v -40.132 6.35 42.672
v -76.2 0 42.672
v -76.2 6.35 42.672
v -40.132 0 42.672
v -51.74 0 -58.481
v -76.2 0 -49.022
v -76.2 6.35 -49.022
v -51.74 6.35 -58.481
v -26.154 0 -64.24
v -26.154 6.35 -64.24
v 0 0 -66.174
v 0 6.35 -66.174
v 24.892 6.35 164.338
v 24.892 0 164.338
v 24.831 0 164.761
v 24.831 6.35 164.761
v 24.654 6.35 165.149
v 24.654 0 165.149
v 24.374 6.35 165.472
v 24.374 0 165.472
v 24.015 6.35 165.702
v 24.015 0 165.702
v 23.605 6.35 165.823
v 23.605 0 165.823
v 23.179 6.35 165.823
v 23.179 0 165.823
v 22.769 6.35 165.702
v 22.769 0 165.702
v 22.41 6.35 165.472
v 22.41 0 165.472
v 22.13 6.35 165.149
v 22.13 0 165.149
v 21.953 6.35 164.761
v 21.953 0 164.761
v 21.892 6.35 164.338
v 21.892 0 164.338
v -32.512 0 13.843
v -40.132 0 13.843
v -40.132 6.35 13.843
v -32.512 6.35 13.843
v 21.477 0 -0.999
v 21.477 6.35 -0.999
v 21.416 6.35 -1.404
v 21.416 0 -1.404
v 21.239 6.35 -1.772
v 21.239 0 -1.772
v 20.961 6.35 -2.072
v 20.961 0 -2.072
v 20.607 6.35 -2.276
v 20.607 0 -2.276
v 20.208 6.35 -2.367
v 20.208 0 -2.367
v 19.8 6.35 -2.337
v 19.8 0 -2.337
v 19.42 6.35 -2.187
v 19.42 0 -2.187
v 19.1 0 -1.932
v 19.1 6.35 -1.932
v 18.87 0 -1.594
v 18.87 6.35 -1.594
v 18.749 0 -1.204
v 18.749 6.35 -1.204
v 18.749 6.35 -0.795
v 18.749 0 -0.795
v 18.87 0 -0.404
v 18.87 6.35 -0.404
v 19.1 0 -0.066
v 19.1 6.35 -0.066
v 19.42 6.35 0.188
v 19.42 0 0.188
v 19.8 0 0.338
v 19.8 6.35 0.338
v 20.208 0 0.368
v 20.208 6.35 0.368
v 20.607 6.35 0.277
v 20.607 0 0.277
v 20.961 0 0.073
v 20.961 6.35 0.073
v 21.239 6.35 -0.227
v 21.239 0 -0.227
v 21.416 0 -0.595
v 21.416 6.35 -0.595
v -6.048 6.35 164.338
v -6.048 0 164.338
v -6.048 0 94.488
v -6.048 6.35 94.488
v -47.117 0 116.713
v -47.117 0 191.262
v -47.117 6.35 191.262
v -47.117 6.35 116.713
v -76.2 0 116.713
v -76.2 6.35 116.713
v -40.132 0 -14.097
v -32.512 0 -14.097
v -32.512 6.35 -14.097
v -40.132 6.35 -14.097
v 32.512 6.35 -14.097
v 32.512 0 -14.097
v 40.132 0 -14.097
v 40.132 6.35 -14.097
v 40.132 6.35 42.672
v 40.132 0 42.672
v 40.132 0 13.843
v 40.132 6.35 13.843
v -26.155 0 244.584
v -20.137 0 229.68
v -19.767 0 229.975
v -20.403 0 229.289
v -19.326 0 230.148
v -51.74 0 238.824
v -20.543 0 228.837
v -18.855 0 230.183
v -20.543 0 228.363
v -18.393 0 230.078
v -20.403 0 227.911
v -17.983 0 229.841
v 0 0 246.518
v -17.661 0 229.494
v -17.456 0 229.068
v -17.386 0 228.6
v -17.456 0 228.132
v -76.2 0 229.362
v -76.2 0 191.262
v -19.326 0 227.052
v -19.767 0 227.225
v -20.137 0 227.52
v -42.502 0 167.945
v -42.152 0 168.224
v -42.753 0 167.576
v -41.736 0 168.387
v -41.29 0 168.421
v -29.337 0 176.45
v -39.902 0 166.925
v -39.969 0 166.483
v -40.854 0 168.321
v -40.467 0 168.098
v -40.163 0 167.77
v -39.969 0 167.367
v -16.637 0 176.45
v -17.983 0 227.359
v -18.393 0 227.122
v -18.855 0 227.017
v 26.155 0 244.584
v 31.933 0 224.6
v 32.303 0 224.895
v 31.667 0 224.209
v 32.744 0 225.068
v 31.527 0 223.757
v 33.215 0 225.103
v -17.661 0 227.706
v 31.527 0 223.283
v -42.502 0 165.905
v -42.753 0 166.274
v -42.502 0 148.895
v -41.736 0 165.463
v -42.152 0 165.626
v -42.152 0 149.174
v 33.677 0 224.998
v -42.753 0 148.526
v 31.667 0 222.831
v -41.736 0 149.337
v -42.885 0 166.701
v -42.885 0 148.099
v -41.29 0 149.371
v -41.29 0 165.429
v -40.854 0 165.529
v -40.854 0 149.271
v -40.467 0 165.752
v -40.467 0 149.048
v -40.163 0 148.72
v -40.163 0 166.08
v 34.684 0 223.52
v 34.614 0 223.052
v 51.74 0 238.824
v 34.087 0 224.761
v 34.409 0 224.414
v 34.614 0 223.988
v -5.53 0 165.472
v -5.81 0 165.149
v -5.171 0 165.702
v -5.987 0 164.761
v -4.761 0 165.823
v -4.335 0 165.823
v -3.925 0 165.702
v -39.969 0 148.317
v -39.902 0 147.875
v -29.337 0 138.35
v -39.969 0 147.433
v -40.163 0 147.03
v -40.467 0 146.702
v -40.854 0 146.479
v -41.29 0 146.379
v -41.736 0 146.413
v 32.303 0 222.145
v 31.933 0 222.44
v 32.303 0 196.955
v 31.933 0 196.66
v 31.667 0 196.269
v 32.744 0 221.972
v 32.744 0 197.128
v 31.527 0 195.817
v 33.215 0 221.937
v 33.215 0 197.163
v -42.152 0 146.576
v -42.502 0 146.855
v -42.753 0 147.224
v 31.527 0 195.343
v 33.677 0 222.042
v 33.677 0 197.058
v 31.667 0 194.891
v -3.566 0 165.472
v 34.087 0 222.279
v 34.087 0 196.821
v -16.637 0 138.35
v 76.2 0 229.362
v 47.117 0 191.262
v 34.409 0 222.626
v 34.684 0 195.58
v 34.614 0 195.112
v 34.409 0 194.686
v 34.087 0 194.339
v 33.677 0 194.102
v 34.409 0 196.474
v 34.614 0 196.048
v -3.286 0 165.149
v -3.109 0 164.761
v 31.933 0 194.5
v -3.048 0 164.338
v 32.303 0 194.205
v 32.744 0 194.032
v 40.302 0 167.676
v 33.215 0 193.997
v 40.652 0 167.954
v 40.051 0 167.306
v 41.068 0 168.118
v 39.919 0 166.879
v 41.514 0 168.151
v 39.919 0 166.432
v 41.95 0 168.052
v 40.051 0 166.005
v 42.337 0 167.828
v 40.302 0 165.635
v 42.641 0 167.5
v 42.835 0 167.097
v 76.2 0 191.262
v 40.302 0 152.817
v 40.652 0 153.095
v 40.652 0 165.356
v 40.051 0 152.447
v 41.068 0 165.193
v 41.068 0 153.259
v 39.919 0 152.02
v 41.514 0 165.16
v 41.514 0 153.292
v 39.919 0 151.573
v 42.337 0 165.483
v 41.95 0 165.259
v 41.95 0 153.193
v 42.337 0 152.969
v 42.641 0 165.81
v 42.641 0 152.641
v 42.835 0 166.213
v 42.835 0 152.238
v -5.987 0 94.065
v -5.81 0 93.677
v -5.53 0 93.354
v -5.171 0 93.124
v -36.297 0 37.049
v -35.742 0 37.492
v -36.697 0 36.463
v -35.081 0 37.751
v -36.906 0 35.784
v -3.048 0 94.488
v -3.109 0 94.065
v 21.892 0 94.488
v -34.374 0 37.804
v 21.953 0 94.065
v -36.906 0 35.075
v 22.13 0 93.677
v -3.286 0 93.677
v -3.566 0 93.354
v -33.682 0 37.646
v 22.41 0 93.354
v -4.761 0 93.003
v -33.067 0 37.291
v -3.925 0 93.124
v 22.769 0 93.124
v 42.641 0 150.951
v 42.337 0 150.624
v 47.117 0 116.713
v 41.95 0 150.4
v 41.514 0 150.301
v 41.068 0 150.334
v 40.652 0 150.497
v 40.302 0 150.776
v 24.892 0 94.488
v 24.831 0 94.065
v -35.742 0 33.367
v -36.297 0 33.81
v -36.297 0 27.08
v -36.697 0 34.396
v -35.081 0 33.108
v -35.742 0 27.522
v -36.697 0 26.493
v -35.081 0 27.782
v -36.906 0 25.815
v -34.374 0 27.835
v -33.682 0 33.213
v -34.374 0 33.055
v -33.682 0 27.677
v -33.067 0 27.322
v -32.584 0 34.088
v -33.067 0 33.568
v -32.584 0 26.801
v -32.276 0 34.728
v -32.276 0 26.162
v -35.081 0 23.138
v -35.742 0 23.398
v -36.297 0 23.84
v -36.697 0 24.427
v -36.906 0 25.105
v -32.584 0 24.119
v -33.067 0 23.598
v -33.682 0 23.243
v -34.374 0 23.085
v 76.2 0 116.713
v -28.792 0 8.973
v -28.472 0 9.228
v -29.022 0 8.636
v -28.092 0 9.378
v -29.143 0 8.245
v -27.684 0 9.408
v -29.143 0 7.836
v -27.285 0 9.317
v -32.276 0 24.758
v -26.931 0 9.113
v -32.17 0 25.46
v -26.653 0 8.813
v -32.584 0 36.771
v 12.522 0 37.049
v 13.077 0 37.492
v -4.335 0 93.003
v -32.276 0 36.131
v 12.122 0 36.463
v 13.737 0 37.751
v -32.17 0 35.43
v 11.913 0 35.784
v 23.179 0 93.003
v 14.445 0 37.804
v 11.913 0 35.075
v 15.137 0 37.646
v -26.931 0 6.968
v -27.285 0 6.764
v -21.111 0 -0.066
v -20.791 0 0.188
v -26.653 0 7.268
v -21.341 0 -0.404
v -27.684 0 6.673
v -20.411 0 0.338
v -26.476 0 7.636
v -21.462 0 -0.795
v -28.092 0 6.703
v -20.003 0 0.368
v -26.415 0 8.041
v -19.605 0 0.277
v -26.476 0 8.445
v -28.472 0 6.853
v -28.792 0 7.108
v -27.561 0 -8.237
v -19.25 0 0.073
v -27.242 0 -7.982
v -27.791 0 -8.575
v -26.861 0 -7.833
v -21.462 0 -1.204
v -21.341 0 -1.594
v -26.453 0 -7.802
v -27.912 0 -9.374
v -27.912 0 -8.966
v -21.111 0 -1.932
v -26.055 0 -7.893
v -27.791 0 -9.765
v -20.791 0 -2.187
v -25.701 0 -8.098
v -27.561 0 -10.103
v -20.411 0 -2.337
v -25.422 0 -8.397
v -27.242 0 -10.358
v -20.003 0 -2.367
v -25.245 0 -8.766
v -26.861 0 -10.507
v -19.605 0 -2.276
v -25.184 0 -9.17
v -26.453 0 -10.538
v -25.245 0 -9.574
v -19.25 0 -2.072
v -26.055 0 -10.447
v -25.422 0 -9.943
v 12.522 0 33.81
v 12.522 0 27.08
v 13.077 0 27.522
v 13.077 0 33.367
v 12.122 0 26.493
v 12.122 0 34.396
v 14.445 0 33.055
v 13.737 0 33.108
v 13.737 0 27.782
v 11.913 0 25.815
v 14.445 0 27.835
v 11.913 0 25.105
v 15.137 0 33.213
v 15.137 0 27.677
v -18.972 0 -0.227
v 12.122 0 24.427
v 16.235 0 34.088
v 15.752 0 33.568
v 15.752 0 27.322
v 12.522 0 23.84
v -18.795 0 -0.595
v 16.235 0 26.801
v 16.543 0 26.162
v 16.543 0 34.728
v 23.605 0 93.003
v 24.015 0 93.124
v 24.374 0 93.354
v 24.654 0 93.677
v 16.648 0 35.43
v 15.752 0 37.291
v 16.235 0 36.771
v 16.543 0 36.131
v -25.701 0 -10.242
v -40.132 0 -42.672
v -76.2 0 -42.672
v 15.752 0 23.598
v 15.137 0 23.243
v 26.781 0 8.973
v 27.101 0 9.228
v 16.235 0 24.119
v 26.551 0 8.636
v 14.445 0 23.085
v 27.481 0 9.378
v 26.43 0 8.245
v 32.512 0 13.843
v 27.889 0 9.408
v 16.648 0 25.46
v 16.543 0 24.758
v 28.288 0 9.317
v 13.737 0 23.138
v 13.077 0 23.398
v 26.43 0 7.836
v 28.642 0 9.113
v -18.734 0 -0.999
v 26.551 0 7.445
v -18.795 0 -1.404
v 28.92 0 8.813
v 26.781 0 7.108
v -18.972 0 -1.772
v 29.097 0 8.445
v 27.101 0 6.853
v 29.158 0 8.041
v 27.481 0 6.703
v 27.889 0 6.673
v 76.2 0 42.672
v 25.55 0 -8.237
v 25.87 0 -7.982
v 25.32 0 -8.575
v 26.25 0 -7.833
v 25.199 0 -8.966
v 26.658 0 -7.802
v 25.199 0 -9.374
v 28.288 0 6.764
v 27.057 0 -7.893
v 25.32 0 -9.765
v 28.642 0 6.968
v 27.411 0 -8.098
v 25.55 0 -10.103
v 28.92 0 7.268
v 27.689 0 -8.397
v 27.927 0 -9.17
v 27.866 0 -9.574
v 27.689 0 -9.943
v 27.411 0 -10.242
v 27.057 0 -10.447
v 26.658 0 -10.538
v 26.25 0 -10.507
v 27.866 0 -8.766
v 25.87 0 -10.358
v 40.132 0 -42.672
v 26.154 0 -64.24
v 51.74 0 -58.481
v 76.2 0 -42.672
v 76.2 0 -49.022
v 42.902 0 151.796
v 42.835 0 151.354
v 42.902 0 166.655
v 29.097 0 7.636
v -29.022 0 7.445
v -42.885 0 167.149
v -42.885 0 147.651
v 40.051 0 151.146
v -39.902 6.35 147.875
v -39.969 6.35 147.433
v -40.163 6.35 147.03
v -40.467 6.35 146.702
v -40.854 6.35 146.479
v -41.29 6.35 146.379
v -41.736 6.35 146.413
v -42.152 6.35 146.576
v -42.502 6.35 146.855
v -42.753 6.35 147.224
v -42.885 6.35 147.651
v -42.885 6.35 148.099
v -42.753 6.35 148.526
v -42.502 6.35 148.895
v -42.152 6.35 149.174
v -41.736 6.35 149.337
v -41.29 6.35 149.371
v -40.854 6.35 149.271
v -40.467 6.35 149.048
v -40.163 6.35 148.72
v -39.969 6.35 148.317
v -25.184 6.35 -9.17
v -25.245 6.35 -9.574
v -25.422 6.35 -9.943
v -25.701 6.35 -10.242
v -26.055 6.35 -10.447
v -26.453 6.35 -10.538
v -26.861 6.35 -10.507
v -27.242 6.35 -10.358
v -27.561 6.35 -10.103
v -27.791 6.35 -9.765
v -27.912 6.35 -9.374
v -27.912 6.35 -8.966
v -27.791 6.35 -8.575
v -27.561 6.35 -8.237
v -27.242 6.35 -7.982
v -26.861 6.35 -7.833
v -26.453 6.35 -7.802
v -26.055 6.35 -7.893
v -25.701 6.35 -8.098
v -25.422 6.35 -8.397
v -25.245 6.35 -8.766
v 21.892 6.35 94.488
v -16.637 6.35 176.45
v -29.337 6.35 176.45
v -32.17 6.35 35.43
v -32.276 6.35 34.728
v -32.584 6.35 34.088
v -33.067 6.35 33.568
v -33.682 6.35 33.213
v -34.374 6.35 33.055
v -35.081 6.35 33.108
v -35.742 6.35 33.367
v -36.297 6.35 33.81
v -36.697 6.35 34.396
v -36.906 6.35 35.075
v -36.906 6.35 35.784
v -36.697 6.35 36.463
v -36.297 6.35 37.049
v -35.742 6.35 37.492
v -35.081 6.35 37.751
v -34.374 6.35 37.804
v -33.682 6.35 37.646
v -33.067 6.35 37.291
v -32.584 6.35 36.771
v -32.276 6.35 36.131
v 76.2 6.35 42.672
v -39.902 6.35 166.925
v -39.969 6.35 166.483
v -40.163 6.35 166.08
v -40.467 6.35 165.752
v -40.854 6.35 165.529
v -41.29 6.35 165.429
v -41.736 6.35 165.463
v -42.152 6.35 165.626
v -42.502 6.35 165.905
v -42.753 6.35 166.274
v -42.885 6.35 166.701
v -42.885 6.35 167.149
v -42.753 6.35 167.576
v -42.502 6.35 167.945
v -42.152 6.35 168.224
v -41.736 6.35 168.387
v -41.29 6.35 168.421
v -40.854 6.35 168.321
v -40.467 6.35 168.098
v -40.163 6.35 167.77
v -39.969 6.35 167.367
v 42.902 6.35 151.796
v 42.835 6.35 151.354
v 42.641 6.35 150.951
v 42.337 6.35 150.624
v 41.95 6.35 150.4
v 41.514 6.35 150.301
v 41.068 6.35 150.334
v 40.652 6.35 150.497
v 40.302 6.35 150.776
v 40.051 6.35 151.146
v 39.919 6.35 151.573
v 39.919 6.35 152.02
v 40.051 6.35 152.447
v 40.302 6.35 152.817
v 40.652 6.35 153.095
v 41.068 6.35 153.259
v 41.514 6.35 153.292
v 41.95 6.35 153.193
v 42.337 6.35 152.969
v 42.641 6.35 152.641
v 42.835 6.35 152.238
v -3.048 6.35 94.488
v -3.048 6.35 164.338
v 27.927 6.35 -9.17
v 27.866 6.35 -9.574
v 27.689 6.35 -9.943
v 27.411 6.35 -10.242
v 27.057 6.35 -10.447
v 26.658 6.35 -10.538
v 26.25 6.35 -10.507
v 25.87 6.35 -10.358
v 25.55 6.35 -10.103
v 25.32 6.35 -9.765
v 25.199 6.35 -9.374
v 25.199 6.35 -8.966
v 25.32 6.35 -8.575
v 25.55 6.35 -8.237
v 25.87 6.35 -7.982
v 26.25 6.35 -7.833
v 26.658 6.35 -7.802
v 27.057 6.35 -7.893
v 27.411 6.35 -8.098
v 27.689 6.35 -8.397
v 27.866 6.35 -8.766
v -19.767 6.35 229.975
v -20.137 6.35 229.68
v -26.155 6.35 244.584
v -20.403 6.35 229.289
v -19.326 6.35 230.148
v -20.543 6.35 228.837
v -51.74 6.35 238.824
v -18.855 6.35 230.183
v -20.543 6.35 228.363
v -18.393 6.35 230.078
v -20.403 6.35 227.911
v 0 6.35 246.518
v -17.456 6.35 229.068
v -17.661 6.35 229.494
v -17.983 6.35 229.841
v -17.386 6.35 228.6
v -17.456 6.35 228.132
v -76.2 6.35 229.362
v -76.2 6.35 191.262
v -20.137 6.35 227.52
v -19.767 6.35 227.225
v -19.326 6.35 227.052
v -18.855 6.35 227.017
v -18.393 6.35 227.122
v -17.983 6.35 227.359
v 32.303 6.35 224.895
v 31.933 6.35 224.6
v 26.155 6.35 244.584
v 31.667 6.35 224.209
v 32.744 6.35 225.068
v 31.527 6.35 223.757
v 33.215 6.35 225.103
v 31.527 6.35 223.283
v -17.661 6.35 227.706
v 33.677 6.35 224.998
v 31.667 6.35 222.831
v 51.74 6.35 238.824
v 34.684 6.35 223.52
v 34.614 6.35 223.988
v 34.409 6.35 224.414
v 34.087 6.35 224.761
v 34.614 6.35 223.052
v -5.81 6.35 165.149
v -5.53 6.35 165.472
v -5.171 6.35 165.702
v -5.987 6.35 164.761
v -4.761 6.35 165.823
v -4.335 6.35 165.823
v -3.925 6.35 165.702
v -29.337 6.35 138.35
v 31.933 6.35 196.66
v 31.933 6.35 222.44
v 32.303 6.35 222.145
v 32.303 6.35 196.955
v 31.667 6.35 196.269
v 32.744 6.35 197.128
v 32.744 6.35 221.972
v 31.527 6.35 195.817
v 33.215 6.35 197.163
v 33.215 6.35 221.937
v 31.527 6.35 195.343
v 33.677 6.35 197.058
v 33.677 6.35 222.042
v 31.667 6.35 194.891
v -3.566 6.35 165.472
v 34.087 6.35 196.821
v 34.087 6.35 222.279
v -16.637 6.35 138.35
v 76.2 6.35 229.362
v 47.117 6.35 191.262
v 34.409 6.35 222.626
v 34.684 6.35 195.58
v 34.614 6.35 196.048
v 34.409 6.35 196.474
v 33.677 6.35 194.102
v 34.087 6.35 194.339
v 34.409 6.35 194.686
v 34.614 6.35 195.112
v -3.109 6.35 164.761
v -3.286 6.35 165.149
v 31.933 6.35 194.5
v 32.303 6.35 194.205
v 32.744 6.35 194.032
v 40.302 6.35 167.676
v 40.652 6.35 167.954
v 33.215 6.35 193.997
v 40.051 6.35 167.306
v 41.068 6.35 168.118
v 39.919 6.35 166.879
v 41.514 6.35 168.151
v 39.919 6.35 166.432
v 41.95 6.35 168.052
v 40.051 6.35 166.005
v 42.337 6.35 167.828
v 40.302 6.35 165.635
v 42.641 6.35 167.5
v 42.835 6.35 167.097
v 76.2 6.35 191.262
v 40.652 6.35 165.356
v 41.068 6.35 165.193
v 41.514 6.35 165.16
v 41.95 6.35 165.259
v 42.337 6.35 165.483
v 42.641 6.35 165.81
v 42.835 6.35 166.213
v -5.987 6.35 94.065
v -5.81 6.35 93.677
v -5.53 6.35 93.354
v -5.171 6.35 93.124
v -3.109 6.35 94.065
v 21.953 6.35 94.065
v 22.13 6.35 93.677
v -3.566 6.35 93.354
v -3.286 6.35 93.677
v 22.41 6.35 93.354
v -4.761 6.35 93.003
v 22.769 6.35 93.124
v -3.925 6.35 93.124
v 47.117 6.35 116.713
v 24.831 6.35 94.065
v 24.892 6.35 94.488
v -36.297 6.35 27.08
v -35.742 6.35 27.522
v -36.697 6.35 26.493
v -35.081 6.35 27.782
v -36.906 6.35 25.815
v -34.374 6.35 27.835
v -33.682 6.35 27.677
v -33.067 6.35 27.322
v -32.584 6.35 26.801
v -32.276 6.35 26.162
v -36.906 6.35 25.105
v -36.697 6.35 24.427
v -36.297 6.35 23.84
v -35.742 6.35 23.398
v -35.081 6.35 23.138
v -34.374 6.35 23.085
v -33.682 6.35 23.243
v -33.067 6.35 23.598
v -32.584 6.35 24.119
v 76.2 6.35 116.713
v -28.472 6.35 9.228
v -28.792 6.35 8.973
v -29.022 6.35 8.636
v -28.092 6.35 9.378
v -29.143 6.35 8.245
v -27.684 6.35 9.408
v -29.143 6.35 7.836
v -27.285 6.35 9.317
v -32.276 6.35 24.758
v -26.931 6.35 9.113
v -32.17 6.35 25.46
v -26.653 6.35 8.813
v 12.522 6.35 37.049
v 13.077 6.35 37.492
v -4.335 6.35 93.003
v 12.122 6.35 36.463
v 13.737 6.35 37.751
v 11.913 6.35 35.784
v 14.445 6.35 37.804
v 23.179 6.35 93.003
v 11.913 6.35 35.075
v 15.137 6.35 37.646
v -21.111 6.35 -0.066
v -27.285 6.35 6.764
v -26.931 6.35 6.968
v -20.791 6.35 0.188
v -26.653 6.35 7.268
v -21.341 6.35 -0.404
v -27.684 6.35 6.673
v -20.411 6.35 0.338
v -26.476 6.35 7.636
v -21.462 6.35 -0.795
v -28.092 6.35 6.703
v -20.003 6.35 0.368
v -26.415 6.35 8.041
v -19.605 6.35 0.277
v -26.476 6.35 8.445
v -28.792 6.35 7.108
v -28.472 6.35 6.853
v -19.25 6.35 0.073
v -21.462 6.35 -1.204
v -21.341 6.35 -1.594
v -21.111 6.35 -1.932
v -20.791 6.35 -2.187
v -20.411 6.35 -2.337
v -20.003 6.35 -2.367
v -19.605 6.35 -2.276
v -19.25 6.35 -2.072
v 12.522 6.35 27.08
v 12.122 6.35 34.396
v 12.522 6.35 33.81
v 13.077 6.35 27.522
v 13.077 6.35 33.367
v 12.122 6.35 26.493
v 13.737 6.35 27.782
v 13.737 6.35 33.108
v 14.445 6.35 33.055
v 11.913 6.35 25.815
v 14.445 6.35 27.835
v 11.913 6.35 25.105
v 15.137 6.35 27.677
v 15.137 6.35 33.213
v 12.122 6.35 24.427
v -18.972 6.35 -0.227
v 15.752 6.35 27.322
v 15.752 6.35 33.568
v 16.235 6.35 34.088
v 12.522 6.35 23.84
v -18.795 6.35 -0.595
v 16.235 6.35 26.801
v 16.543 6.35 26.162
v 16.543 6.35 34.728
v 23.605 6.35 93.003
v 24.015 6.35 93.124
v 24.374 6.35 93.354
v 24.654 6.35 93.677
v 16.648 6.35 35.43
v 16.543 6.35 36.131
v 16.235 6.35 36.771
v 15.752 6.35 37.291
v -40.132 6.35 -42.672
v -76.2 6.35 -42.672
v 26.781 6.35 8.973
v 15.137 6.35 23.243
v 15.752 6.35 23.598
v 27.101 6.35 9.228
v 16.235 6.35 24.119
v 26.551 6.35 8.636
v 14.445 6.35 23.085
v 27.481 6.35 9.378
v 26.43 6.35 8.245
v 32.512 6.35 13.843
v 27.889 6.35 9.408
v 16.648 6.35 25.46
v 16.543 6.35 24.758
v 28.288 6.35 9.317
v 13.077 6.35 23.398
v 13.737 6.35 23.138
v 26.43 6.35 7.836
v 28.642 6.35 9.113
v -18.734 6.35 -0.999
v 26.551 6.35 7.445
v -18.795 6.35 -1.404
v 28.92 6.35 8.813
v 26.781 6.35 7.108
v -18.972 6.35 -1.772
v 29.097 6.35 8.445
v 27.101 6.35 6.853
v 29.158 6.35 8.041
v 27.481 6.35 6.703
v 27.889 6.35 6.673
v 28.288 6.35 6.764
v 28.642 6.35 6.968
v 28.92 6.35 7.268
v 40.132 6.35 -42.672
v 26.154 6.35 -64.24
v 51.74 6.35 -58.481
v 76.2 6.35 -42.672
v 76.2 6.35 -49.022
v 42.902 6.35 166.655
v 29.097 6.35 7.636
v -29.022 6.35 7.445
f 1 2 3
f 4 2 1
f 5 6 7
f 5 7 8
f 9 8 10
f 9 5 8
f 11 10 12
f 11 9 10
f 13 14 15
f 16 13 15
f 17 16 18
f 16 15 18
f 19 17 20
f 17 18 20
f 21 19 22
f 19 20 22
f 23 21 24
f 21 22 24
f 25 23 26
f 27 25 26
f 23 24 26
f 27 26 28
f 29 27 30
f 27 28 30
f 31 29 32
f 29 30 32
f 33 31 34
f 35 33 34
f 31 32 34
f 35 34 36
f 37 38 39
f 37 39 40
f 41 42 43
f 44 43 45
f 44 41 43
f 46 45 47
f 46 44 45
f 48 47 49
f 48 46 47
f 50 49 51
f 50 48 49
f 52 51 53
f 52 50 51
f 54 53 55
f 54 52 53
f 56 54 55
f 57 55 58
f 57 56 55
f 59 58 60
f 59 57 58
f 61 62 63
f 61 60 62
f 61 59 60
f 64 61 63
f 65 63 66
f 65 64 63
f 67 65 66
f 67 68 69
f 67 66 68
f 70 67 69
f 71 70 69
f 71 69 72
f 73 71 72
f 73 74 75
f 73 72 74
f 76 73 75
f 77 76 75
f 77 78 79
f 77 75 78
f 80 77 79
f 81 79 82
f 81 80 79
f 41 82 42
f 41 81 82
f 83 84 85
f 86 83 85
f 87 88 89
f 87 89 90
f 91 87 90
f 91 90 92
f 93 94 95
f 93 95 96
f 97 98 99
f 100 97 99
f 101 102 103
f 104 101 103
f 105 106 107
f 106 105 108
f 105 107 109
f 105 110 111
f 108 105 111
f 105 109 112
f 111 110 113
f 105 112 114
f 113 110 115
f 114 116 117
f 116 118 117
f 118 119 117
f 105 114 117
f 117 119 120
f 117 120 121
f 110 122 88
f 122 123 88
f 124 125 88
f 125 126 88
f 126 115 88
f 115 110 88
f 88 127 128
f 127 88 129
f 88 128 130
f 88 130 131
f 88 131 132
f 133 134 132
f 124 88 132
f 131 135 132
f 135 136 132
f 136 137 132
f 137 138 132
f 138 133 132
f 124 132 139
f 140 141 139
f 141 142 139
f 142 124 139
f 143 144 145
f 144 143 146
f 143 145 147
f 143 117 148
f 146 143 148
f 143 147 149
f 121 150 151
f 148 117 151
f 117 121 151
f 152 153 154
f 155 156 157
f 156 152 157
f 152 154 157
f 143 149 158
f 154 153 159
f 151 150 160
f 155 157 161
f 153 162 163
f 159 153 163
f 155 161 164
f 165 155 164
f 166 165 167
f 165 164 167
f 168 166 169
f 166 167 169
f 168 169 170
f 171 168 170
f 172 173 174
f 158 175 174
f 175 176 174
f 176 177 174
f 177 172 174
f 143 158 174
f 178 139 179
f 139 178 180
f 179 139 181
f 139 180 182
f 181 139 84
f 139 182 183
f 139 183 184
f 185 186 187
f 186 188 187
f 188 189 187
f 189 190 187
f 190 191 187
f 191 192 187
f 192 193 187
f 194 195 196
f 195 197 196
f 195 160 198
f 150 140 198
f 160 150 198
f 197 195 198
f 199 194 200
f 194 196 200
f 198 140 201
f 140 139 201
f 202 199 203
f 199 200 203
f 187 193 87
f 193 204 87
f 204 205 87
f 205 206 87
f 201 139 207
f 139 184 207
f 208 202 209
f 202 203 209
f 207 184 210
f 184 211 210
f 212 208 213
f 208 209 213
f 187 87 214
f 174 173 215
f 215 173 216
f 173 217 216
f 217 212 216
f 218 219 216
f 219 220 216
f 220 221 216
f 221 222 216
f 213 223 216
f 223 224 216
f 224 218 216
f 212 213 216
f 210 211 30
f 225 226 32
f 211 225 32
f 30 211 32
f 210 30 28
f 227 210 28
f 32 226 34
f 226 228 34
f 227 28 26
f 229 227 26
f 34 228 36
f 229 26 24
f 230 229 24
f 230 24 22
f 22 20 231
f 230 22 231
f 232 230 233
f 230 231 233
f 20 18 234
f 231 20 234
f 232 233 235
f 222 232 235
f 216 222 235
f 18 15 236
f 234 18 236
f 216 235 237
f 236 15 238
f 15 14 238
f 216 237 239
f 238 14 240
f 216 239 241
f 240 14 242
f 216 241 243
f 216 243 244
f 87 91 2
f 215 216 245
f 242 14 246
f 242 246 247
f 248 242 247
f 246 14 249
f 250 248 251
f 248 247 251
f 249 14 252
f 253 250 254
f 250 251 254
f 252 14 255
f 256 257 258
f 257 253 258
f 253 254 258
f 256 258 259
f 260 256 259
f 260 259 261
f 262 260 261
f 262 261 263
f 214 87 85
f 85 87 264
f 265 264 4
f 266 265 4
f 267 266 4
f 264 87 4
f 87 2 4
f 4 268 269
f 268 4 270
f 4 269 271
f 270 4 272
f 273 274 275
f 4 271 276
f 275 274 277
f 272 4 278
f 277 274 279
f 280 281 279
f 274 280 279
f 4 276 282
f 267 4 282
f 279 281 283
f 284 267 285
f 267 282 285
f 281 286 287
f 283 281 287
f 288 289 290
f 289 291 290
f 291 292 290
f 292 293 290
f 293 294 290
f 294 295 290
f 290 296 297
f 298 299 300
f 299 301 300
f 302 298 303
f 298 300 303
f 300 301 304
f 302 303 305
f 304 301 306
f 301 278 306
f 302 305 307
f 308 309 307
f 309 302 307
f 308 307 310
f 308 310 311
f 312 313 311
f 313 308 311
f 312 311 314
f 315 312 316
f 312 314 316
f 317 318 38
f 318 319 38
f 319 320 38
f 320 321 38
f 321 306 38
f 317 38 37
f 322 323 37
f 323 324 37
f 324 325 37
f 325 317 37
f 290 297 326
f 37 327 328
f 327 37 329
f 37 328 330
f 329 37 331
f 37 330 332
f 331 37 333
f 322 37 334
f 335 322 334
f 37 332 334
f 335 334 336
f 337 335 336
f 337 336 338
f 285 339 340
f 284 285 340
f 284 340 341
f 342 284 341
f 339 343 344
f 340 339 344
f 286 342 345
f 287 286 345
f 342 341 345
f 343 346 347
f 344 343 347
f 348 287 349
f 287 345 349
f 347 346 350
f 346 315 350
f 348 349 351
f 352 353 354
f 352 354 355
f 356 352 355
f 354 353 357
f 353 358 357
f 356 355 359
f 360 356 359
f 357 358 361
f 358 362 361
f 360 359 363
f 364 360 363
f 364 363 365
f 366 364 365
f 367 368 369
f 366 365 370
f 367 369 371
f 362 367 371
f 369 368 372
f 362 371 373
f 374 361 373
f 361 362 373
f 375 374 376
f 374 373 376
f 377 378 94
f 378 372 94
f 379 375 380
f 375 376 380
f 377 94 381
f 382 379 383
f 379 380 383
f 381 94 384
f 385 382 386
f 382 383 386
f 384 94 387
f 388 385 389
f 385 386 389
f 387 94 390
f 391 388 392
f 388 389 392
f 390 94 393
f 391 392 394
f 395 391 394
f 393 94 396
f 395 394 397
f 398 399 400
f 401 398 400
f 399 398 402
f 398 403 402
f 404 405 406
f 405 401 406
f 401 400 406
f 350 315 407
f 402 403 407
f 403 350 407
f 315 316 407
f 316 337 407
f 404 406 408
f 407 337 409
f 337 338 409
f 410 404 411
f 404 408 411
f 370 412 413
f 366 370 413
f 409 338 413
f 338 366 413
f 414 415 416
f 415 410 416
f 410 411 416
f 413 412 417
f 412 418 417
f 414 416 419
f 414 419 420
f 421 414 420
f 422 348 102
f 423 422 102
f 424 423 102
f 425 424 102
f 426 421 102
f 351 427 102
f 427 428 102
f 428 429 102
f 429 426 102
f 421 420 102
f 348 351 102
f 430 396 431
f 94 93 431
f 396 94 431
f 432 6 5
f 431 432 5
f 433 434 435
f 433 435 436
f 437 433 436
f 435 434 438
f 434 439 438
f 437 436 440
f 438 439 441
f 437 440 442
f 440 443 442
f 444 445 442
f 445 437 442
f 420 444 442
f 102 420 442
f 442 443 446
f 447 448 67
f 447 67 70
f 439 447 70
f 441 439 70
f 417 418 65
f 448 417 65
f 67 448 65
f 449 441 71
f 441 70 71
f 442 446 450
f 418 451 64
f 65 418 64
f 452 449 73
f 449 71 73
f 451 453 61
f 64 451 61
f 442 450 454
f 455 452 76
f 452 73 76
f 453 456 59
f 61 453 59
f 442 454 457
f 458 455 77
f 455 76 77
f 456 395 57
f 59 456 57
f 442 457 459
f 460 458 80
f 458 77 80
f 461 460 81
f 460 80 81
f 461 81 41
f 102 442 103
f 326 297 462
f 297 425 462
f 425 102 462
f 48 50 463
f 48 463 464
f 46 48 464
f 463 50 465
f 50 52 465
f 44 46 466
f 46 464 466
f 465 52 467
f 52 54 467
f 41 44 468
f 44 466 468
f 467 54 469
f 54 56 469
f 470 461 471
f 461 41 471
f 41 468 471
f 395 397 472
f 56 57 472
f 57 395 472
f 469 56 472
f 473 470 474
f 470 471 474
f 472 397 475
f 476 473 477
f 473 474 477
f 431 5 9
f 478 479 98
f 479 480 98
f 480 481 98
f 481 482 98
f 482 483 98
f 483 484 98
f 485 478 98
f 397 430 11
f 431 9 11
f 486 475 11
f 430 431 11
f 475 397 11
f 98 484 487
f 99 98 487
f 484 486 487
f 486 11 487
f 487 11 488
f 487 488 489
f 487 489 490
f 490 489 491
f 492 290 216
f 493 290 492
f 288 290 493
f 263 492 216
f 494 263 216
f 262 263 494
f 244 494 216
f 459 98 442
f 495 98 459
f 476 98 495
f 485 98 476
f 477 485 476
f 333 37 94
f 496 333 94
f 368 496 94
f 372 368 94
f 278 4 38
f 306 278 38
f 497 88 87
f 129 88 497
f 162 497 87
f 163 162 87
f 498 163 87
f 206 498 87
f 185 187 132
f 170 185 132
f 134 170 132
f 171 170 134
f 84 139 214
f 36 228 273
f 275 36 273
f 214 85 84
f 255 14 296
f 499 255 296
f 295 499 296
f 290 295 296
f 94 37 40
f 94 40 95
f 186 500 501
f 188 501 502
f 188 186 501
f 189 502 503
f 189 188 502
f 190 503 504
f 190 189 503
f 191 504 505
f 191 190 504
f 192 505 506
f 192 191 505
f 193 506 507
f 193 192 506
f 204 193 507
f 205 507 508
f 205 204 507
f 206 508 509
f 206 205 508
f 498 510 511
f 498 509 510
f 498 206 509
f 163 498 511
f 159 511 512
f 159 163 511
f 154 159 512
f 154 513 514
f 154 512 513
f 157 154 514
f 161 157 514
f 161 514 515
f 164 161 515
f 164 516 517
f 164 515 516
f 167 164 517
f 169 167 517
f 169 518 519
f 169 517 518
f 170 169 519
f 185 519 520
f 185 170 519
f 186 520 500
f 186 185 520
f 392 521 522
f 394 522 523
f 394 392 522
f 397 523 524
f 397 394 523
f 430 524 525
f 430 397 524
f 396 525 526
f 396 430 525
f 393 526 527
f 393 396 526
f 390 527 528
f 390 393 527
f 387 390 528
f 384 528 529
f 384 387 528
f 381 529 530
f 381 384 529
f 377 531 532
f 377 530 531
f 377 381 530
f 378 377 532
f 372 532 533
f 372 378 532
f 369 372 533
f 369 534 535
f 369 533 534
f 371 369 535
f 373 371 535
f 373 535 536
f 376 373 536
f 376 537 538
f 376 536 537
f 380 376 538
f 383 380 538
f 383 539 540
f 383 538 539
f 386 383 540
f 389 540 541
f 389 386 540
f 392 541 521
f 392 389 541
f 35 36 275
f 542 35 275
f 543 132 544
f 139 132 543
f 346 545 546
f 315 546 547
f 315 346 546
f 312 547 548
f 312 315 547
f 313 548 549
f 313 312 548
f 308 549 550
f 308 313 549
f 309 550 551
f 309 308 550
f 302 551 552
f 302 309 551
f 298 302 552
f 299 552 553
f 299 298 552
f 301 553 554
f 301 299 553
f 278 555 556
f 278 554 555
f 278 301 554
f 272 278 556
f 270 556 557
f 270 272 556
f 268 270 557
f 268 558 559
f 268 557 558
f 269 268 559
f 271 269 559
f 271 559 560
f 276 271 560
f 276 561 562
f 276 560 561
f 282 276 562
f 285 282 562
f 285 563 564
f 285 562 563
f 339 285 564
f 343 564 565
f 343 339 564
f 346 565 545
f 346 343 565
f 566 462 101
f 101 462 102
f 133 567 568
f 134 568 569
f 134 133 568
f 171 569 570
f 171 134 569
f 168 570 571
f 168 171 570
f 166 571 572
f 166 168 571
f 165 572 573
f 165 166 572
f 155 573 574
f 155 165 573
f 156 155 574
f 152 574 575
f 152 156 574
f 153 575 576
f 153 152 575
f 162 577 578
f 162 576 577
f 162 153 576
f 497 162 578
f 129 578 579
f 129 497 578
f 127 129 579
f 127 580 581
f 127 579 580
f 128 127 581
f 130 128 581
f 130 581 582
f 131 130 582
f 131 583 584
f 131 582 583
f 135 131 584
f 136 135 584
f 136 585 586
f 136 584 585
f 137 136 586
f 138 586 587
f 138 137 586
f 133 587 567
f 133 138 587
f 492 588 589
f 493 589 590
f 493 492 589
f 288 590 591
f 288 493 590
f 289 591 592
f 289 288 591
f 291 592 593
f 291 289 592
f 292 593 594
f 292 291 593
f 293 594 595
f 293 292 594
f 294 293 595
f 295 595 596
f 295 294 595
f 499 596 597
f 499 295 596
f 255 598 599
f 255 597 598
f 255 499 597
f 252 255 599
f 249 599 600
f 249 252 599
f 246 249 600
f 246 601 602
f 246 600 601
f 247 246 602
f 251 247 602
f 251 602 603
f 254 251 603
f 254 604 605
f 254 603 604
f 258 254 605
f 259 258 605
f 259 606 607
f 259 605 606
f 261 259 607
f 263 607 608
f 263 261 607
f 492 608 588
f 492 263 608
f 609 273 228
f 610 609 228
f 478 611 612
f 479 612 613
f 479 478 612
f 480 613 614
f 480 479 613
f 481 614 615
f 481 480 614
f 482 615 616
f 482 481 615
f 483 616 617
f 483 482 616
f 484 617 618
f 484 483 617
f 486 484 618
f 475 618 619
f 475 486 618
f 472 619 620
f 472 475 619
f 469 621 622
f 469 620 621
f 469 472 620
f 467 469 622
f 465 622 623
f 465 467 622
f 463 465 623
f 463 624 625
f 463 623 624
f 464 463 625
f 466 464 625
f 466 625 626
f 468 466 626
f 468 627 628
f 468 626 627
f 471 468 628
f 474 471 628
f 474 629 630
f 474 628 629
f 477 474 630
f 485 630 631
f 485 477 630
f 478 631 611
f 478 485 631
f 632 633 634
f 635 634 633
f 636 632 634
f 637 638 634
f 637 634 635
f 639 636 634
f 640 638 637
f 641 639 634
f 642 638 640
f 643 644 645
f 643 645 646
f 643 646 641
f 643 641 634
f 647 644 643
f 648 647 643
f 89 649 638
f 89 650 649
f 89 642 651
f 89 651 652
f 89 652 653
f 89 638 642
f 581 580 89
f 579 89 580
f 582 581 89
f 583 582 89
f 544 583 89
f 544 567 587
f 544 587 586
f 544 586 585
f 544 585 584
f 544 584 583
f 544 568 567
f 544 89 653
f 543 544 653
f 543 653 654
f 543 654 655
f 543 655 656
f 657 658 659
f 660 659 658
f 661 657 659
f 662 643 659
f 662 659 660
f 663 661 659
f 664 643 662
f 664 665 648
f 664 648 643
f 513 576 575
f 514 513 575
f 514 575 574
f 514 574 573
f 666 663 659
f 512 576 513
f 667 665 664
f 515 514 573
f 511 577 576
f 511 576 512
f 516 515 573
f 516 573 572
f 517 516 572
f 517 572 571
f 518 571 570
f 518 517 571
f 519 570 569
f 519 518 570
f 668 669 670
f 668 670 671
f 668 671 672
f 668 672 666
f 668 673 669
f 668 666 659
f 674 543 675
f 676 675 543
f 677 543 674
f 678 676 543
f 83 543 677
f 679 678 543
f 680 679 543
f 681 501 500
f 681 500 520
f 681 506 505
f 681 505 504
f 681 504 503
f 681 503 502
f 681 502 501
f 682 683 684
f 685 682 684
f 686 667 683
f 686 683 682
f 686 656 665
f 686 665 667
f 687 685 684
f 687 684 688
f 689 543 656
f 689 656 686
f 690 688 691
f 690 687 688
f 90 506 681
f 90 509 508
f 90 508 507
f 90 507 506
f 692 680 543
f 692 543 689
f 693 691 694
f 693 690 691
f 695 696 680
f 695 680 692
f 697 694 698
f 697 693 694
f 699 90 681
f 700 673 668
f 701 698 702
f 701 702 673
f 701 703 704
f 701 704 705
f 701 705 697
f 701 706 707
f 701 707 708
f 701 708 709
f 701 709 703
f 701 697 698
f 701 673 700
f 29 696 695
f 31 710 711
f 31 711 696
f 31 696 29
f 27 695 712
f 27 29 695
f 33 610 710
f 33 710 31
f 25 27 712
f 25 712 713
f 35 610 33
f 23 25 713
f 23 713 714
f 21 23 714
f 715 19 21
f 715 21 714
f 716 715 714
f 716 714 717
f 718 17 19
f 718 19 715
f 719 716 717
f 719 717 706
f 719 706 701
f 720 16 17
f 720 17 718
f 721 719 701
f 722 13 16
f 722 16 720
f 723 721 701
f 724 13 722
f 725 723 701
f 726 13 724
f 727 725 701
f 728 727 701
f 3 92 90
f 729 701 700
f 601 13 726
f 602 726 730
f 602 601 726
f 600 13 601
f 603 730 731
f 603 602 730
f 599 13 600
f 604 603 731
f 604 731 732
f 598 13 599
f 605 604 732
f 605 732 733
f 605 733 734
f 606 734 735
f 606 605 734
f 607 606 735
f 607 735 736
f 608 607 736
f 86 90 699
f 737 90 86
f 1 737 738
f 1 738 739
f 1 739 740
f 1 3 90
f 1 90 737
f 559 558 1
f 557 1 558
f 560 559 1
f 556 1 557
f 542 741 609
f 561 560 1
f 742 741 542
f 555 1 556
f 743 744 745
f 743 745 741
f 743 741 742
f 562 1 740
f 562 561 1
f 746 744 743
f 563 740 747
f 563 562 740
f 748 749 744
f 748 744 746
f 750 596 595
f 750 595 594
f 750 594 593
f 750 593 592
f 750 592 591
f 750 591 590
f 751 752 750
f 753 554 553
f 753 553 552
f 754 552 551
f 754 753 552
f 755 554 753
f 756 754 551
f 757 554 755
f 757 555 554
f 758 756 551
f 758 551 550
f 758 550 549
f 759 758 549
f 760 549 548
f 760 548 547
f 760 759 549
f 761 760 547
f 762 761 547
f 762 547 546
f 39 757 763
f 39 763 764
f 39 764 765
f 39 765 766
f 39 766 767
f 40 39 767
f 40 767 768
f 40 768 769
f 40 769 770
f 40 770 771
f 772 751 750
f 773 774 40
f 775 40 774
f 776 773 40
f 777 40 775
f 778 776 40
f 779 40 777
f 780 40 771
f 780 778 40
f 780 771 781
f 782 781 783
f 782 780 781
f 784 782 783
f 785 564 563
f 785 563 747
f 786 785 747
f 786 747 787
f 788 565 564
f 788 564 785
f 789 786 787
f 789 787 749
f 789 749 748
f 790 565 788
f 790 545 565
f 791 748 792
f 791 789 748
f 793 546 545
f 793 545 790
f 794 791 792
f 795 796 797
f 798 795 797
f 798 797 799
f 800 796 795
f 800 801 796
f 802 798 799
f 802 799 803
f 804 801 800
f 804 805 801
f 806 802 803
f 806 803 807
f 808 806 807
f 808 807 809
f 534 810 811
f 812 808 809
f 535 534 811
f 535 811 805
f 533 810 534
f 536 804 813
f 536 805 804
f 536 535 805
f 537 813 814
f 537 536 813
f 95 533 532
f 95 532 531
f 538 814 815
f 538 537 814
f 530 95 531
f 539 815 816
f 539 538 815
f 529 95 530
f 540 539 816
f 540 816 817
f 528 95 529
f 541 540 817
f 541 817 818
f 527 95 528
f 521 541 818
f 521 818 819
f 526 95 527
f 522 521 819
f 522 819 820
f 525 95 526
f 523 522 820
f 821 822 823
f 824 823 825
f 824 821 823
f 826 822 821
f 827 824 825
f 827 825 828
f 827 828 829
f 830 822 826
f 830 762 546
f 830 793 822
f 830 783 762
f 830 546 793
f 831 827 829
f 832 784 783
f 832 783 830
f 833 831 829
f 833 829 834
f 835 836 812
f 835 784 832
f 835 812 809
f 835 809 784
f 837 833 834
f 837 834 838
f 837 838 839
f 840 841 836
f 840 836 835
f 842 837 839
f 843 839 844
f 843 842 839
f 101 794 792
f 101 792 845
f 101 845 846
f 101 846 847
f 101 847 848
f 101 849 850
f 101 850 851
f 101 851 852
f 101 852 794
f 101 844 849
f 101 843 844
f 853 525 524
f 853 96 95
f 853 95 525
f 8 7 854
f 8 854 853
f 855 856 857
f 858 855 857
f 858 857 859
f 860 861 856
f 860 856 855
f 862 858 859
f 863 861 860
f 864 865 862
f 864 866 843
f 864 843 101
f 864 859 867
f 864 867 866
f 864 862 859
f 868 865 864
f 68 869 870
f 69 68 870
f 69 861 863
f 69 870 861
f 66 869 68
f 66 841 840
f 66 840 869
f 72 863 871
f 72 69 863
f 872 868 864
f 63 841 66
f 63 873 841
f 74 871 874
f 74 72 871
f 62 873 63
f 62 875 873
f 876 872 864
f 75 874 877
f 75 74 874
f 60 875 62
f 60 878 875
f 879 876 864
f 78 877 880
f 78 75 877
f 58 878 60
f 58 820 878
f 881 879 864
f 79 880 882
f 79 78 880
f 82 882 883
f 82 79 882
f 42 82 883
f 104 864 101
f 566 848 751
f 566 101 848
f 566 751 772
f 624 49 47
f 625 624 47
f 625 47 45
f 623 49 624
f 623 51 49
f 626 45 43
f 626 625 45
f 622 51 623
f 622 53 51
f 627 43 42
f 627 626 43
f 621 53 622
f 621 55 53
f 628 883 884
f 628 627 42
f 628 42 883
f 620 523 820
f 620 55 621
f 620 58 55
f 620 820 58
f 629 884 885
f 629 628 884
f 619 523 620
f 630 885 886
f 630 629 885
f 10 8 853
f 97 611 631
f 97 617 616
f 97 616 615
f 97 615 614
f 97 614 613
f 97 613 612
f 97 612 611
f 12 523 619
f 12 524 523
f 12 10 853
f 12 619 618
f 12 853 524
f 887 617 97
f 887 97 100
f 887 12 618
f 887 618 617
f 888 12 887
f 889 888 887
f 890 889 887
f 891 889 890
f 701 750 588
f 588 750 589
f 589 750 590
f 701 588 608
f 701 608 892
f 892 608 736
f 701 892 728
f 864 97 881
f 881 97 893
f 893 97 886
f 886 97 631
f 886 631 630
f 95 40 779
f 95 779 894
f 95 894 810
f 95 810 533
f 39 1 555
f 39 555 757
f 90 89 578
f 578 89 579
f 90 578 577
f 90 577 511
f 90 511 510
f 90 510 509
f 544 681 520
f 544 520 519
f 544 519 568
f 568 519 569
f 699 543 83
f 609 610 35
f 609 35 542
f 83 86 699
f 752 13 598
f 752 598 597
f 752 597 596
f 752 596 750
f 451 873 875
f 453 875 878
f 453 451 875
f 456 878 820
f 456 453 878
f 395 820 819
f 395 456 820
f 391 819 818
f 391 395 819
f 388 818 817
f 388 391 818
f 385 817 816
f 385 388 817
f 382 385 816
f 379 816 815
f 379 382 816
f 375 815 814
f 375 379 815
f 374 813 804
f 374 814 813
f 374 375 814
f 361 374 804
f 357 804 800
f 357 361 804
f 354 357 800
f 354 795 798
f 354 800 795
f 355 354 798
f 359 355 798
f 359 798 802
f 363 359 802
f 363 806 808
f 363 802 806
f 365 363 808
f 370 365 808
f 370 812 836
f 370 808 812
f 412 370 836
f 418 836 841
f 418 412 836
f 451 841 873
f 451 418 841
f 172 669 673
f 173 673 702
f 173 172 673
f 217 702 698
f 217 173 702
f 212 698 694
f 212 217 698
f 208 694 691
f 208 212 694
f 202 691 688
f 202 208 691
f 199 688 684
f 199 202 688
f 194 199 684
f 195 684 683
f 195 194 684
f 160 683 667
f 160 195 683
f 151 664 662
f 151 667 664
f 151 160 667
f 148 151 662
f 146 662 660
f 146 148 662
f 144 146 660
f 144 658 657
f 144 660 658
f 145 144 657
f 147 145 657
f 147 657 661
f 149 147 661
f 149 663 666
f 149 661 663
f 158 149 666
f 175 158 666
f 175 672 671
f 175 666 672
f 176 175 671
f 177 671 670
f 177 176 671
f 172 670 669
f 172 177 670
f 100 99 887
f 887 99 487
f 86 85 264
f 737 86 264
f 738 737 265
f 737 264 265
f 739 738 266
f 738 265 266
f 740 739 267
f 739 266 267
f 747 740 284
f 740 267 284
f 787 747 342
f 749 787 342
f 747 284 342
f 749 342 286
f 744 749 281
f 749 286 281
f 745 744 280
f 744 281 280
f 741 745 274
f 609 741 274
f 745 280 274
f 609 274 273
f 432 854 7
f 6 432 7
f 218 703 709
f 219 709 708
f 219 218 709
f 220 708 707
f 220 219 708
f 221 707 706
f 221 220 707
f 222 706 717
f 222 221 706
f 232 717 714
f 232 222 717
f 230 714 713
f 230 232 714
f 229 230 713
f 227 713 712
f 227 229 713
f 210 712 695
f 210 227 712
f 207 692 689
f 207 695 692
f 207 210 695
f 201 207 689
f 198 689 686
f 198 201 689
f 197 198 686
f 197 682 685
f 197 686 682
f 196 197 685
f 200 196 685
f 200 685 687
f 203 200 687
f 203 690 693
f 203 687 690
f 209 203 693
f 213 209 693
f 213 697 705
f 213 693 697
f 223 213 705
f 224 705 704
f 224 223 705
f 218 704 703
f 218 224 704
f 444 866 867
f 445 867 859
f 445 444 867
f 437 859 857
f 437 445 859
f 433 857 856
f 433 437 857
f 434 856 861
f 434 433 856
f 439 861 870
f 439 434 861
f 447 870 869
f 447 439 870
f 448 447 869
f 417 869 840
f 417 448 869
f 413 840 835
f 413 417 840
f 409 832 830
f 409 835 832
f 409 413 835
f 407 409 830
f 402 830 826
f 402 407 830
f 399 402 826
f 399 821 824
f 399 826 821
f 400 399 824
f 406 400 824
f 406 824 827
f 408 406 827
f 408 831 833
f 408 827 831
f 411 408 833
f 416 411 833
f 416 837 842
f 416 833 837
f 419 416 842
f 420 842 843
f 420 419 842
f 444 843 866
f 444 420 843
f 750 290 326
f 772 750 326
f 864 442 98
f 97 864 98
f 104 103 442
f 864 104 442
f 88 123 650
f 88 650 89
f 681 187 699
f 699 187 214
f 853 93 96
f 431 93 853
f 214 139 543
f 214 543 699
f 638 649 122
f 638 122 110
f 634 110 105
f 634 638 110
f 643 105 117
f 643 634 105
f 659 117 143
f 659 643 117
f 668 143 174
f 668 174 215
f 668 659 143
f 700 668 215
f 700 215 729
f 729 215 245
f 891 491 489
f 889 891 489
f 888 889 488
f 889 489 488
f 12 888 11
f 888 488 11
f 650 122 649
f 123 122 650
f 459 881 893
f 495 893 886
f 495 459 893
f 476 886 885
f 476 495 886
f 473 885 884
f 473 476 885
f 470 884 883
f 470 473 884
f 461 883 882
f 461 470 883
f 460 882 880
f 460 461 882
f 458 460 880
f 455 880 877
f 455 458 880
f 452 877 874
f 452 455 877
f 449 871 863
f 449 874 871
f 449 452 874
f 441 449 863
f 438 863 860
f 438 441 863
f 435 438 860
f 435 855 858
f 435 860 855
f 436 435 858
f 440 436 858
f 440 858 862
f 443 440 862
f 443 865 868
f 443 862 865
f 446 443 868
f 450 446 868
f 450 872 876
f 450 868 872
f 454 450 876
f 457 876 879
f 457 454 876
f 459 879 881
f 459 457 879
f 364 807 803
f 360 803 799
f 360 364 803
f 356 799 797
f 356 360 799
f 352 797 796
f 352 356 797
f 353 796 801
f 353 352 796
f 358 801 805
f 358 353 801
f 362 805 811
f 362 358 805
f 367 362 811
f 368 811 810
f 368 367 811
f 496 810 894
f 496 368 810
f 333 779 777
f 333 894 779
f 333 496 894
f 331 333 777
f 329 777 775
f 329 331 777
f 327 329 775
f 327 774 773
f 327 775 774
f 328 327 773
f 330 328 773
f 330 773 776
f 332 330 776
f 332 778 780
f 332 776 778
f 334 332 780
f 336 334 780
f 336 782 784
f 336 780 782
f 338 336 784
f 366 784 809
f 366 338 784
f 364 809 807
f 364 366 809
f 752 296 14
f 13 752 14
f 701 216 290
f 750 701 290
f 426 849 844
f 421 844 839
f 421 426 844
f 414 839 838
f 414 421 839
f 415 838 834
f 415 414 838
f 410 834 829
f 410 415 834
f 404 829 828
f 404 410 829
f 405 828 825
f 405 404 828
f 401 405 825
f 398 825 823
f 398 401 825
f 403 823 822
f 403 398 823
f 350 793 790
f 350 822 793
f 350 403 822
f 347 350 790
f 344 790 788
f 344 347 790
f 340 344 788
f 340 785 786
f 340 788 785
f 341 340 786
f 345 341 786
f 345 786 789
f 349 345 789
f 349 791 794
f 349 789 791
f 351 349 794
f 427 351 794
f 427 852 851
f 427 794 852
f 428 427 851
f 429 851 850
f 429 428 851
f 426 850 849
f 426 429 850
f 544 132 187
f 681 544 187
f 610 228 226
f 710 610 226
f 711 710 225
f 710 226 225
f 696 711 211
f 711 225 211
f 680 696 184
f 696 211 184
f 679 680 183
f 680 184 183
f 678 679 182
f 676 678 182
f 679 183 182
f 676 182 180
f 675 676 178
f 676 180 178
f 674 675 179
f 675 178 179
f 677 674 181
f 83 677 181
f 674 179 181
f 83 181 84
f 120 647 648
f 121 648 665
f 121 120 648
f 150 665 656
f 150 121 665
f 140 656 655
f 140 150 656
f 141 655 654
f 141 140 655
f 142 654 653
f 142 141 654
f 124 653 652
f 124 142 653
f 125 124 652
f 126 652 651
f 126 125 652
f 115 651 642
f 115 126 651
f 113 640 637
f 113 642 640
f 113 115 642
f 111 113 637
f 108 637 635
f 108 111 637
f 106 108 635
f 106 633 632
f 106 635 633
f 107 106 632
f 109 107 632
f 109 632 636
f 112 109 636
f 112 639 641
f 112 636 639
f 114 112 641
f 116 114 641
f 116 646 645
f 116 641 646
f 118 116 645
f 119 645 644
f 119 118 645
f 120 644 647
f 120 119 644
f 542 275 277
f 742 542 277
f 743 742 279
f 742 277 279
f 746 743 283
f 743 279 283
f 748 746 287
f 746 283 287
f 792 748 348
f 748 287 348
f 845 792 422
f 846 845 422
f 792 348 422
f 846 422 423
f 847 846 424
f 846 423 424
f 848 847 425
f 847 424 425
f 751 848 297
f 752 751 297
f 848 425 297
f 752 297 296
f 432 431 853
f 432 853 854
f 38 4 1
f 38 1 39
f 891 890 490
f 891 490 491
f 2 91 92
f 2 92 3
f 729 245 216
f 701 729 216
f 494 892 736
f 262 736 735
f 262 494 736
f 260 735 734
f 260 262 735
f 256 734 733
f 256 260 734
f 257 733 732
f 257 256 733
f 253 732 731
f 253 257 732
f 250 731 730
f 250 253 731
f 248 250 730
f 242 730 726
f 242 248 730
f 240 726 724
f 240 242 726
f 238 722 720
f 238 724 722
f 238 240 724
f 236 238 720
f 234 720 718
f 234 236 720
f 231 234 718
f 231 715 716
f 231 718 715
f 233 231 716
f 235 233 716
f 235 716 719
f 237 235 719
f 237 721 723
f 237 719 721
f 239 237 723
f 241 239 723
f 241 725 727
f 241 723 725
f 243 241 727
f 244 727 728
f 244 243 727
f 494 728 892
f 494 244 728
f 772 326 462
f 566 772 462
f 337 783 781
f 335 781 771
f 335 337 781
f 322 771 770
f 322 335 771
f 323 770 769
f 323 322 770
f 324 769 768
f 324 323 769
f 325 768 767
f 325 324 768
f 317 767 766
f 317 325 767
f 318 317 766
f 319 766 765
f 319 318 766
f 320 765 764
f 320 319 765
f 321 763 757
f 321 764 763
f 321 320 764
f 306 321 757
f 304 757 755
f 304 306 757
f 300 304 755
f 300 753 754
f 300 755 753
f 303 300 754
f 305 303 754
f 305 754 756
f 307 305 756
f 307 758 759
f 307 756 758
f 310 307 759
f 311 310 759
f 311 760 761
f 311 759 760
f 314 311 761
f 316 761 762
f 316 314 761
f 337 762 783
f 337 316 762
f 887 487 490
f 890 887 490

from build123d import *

# Parameters (mm, degrees)
CHASSIS_DEPTH       = 6.35
BOSS_EXTRUDE1_DEPTH = 6.35
SKETCH2_R           = 1.5875
SKETCH2_R_2         = 1.5
SKETCH2_R_3         = 1.3716
SKETCH2_R_4         = 2.38125
SKETCH2_W           = 12.7
SKETCH2_H           = 38.1
CUT_EXTRUDE1_DEPTH  = 17.78


with BuildPart() as part:
    # Sketch1 → Chassis (new body)
    with BuildSketch(Plane(origin=(0, 0, 0), x_dir=(1, 0, 0), z_dir=(0, 1, 0))):
        with BuildLine():
            Line((0, 66.173750115), (0, -229.362))
            Line((0, -229.362), (76.2, -229.362))
            Line((76.2, -229.362), (76.2, -191.262))
            Line((76.2, -191.262), (47.117, -191.262))
            Line((47.117, -191.262), (47.117, -116.713))
            Line((47.117, -116.713), (76.2, -116.713))
            Line((76.2, -116.713), (76.2, -42.672))
            Line((76.2, -42.672), (40.132, -42.672))
            Line((40.132, -42.672), (40.132, -13.843))
            Line((40.132, -13.843), (32.512, -13.843))
            Line((32.512, -13.843), (32.512, 14.097))
            Line((32.512, 14.097), (40.132, 14.097))
            Line((40.132, 14.097), (40.132, 42.672))
            Line((40.132, 42.672), (76.2, 42.672))
            Line((76.2, 42.672), (76.2, 49.022))
            ThreePointArc((76.2, 49.022), (39.053241005, 61.832834411), (0, 66.173750115))
        make_face()
    chassis = extrude(amount=CHASSIS_DEPTH)

    # Mirror1: Chassis across plane
    add(chassis.mirror(Plane(origin=(0, 6.35, 0), x_dir=(0, 0, 1), z_dir=(1, 0, 0))))

    # Sketch4 → Boss-Extrude1 (add)
    with BuildSketch(Plane(origin=(0, 6.35, 0), x_dir=(1, 0, 0), z_dir=(0, 1, 0))):
        with BuildLine():
            Line((76.2, -229.362), (-76.2, -229.362))
            ThreePointArc((-76.2, -229.362), (0, -246.518294863), (76.2, -229.362))
        make_face()
    extrude(amount=-BOSS_EXTRUDE1_DEPTH)

    # Sketch2 → Cut-Extrude1 (cut)
    with BuildSketch(Plane(origin=(0, 0, 0), x_dir=(1, 0, 0), z_dir=(0, 1, 0))):
        with Locations((33.096859047, -195.58)):
            Circle(SKETCH2_R)
        with Locations((-18.973140953, -228.6)):
            Circle(SKETCH2_R)
        with Locations((33.096859047, -223.52)):
            Circle(SKETCH2_R)
        with Locations((41.402, -151.796334461)):
            Circle(SKETCH2_R_2)
        with Locations((-26.555704526, 9.169971692)):
            Circle(SKETCH2_R_3)
        with Locations((-20.105647723, 0.999384842)):
            Circle(SKETCH2_R_3)
        with Locations((-27.786476371, -8.040568412)):
            Circle(SKETCH2_R_3)
        with Locations((26.555704526, 9.169971692)):
            Circle(SKETCH2_R_3)
        with Locations((20.105647723, 0.999384842)):
            Circle(SKETCH2_R_3)
        with Locations((27.786476371, -8.040568412)):
            Circle(SKETCH2_R_3)
        with Locations((14.2672, -25.46003476)):
            Circle(SKETCH2_R_4)
        with Locations((14.2672, -35.42953476)):
            Circle(SKETCH2_R_4)
        with Locations((-34.5516, -25.46003476)):
            Circle(SKETCH2_R_4)
        with Locations((-34.5516, -35.42953476)):
            Circle(SKETCH2_R_4)
        with Locations((-41.402, -147.875000023)):
            Circle(SKETCH2_R_2)
        with Locations((-41.402, -166.925000023)):
            Circle(SKETCH2_R_2)
        with Locations((41.402, -166.655334461)):
            Circle(SKETCH2_R_2)
        with BuildLine():
            Line((24.892, -94.488), (24.892, -164.338))
            ThreePointArc((24.892, -164.338), (23.392, -165.838), (21.892, -164.338))
            Line((21.892, -164.338), (21.892, -94.488))
            ThreePointArc((21.892, -94.488), (23.392, -92.988), (24.892, -94.488))
        make_face()
        with BuildLine():
            Line((-3.048, -94.488), (-3.048, -164.338))
            ThreePointArc((-3.048, -164.338), (-4.548, -165.838), (-6.048, -164.338))
            Line((-6.048, -164.338), (-6.048, -94.488))
            ThreePointArc((-6.048, -94.488), (-4.548, -92.988), (-3.048, -94.488))
        make_face()
        with Locations((-22.987, -157.400000023)):
            Rectangle(SKETCH2_W, SKETCH2_H)
    extrude(amount=CUT_EXTRUDE1_DEPTH, mode=Mode.SUBTRACT)


solid = part.part
